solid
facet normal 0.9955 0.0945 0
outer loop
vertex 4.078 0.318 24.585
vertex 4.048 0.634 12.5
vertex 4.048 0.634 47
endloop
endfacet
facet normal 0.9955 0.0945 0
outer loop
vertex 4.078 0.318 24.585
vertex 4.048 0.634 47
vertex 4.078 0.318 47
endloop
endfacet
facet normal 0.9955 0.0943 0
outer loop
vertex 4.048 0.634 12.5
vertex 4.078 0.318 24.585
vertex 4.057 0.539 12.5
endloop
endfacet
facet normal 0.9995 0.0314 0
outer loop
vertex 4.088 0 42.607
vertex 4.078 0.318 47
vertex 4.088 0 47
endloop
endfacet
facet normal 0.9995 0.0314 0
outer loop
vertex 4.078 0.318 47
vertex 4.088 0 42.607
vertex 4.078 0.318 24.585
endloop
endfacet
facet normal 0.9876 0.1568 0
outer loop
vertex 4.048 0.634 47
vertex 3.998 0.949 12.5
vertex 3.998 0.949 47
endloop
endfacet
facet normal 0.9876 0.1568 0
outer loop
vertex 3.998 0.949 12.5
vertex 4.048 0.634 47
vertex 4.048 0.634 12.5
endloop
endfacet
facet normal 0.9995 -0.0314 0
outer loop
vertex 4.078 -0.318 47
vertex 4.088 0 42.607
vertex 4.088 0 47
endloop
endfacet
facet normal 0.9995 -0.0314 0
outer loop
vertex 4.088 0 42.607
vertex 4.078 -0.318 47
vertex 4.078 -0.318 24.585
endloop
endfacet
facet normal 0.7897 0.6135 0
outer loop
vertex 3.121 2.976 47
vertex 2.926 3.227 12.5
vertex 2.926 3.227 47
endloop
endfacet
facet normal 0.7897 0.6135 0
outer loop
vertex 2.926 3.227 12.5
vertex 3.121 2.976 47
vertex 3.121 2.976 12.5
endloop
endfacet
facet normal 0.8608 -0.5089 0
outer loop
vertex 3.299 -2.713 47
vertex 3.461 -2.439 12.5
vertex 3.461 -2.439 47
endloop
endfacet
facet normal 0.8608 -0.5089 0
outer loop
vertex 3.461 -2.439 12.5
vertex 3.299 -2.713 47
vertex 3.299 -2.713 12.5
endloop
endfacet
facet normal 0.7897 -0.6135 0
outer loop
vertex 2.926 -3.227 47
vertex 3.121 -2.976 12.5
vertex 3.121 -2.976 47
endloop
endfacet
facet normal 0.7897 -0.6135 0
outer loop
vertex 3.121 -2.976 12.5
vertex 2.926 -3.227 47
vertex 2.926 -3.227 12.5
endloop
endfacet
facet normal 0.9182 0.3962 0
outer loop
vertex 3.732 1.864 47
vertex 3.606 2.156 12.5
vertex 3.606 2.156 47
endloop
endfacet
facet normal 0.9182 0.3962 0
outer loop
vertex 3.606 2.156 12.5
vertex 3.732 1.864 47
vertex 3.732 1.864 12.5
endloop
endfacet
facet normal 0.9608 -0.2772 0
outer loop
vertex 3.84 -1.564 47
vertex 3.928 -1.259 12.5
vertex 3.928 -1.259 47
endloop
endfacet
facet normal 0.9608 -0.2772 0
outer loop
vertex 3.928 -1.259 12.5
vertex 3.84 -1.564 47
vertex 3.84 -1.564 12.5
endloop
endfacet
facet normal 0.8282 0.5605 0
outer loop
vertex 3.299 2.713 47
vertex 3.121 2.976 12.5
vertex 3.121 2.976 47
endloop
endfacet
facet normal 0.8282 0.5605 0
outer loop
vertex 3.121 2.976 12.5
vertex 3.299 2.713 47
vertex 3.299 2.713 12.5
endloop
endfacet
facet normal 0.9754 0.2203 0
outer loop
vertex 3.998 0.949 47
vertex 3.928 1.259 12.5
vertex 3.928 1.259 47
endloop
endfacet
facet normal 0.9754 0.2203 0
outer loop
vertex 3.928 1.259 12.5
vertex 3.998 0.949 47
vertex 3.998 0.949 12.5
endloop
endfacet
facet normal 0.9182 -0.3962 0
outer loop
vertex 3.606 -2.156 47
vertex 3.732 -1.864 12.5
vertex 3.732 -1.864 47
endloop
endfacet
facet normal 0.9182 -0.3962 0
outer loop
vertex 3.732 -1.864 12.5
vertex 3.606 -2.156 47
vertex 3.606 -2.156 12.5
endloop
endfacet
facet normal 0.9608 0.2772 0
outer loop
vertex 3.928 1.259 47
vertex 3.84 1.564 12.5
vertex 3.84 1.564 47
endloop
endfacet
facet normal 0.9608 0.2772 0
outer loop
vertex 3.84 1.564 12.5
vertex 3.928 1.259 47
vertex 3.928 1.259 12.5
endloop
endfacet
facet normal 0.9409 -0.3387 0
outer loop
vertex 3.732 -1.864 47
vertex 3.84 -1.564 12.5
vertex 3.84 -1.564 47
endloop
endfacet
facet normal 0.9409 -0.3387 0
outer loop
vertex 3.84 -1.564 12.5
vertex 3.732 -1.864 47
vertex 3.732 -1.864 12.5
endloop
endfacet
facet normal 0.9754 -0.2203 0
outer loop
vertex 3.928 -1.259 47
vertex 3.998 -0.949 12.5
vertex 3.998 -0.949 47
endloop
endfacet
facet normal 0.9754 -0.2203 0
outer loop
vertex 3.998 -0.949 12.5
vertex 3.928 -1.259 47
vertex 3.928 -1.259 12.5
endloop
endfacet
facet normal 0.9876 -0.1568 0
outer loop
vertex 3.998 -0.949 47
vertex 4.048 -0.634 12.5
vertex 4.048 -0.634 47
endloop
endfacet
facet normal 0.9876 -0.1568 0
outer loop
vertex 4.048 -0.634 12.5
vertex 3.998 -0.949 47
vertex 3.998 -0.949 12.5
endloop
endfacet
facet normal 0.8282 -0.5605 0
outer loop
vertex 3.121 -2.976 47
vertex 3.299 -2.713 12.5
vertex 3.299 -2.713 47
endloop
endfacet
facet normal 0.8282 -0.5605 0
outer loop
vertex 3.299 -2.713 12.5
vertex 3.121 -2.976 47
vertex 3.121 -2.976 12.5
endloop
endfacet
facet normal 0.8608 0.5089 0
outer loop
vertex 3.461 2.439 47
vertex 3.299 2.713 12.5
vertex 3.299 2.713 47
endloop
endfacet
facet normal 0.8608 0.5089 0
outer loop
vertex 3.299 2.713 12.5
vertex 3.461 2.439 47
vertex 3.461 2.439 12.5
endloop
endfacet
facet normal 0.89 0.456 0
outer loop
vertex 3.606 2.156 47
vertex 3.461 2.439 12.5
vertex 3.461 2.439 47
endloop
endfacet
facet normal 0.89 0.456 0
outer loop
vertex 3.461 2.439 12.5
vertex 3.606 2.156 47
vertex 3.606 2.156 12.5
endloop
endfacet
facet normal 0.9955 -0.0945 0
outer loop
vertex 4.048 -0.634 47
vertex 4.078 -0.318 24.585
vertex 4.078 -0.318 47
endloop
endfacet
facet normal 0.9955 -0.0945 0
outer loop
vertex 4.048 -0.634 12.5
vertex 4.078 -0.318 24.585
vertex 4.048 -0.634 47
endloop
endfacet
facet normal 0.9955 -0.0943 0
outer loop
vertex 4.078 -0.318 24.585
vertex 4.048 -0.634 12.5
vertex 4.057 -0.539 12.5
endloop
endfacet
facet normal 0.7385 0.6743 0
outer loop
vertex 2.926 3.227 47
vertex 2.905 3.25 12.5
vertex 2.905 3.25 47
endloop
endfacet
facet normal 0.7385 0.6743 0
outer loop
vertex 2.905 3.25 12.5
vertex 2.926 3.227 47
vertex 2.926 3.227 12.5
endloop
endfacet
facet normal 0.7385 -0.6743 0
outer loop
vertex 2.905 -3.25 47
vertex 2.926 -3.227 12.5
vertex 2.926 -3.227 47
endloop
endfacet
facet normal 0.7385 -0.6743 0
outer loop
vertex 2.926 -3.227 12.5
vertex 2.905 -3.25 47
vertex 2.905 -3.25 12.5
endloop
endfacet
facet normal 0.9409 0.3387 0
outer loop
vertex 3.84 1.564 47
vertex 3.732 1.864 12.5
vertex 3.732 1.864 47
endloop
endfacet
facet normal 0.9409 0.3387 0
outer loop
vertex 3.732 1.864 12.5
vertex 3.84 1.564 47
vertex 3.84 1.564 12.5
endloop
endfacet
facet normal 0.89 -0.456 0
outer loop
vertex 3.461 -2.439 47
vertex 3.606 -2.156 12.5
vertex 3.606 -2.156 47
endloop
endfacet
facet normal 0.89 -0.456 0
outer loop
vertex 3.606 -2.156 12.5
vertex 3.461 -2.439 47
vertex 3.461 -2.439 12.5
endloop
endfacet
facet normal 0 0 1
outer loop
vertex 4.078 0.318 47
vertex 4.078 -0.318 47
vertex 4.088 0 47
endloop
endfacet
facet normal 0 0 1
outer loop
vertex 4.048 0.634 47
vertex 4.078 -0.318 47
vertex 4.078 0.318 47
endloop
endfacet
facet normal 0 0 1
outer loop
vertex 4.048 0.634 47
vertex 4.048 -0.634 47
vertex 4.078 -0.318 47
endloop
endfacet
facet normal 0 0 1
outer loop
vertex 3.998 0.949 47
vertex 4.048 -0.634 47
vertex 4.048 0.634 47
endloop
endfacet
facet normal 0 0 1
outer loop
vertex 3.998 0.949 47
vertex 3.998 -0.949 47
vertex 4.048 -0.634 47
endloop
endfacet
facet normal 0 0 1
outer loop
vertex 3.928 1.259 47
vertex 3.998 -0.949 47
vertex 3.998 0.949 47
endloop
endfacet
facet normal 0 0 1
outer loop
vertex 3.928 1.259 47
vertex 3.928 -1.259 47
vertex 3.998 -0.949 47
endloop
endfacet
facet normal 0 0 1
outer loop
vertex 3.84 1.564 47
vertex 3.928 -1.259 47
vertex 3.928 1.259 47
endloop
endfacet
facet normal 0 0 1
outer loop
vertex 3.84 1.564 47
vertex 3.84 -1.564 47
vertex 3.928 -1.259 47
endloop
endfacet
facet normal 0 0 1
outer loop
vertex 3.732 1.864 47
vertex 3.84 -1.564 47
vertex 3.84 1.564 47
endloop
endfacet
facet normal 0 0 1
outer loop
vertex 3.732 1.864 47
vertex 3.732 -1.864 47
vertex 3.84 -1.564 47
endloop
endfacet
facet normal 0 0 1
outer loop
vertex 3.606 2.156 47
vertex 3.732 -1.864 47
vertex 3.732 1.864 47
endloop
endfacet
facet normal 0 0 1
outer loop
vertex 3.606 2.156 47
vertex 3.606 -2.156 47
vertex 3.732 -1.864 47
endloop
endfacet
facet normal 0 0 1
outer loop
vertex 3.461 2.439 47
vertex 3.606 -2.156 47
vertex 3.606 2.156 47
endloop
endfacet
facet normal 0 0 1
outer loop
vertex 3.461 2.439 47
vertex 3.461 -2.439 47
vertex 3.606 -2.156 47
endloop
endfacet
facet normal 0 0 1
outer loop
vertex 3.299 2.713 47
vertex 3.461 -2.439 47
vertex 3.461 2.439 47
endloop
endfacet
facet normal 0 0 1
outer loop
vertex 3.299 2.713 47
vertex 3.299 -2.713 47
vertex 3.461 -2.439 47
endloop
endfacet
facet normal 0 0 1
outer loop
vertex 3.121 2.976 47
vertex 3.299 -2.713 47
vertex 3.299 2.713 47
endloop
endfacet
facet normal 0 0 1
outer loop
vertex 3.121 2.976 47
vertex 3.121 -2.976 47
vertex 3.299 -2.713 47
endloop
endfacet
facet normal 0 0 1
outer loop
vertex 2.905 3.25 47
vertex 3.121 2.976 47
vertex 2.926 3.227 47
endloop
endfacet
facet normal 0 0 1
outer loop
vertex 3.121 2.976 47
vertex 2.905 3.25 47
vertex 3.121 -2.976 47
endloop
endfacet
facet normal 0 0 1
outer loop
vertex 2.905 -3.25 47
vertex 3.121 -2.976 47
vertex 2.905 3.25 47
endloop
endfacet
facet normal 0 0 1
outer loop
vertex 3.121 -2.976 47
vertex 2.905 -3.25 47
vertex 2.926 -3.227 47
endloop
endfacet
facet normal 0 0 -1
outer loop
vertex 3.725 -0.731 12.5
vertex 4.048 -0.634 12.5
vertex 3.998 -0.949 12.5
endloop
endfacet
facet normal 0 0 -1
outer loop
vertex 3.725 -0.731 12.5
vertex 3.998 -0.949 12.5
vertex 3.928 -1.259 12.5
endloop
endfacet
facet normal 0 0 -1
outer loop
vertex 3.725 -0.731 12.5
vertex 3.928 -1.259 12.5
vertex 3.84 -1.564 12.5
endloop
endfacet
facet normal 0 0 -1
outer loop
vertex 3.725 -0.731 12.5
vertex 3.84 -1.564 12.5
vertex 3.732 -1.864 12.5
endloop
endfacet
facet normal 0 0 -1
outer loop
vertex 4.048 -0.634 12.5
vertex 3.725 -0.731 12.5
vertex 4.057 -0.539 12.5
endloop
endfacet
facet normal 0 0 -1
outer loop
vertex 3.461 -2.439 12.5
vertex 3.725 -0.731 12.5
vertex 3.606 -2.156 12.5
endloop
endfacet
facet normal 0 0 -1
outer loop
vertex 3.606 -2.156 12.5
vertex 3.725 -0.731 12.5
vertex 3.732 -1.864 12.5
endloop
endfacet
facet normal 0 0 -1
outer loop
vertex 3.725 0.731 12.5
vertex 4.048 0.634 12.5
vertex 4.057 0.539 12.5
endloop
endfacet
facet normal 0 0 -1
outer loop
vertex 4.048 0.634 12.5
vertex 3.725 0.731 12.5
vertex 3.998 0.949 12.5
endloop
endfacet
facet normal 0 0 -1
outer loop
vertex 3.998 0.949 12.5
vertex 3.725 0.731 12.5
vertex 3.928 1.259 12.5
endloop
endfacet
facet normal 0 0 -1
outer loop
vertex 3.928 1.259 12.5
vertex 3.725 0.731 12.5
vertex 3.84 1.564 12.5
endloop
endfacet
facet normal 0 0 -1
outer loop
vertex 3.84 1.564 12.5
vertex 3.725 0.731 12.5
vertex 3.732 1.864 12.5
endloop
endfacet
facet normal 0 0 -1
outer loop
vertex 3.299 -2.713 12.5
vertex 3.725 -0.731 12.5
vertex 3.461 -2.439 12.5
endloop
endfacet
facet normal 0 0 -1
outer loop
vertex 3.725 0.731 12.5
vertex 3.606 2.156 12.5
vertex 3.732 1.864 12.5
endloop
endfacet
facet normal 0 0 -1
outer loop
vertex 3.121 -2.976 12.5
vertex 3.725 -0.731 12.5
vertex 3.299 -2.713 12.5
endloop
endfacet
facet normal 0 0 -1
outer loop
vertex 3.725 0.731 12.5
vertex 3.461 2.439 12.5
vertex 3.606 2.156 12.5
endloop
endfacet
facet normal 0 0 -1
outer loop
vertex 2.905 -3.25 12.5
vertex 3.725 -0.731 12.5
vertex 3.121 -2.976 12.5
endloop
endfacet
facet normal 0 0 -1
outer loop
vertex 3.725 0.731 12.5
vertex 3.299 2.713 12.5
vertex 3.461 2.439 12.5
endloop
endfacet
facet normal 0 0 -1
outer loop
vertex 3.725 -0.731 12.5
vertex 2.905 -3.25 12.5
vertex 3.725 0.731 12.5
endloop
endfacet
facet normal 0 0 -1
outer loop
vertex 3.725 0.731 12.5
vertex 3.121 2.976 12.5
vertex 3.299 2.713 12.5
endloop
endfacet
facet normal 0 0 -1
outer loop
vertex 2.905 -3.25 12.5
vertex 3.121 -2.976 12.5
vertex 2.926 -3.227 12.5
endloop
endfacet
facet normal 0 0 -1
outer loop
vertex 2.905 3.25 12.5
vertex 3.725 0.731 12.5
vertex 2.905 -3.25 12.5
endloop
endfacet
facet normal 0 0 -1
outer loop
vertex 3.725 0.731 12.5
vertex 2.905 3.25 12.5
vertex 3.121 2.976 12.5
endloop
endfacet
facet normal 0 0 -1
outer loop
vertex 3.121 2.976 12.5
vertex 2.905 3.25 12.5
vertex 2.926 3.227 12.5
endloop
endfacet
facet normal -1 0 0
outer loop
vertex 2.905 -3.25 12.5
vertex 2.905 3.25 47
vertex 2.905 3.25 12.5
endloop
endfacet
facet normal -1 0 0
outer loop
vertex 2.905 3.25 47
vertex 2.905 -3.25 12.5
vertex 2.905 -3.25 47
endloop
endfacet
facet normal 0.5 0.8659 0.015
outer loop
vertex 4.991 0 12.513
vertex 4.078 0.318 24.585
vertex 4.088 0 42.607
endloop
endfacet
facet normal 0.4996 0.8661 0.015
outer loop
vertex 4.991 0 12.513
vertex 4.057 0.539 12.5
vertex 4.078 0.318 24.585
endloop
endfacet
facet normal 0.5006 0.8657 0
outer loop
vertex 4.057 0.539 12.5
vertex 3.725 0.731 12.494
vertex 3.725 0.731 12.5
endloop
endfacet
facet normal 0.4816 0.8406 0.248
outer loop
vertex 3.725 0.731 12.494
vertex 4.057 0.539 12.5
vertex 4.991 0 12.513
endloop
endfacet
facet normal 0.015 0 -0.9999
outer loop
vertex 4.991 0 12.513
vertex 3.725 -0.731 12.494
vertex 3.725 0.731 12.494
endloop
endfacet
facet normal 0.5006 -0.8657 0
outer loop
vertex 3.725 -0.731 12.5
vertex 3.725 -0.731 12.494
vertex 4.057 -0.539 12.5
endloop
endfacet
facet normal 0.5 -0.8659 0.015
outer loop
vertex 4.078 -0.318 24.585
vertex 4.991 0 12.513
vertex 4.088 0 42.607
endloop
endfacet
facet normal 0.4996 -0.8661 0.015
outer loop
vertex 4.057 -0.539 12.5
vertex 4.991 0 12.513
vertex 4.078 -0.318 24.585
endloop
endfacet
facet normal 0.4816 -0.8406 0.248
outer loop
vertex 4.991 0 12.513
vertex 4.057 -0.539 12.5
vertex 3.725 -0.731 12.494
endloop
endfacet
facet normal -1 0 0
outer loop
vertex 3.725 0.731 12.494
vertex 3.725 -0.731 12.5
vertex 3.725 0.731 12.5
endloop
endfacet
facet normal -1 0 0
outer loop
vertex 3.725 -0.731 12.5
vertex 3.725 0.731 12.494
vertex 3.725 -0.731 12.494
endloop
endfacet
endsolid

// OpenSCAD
// file: reed/BOSL2/std.scad
// Minimal BOSL2 compatibility shim for bundled gallery models.
// It implements only the helpers used by the imported OpenSCAD projects.

CENTER = [0, 0, 0];
BOTTOM = [0, 0, -1];
TOP = [0, 0, 1];
LEFT = [-1, 0, 0];
RIGHT = [1, 0, 0];
FRONT = [0, -1, 0];
BACK = [0, 1, 0];

module up(z=0) {
    translate([0, 0, z]) children();
}

module down(z=0) {
    translate([0, 0, -z]) children();
}

module attach(anchor=CENTER) {
    children();
}

module cuboid(size=[1, 1, 1], anchor=CENTER) {
    center = anchor == CENTER;
    translate(center ? [0, 0, 0] : [0, 0, size[2] / 2])
        cube(size, center=true);
    children();
}

module xcyl(h=1, r=1, anchor=CENTER) {
    center = anchor == CENTER;
    translate(center ? [0, 0, 0] : [h / 2, 0, 0])
        rotate([0, 90, 0])
            cylinder(h=h, r=r, center=true);
}
// file: reed/reed.scad
use <BOSL2/std.scad>

holder_completeness_percent = 33;

module pipe(length, outer_diameter, thickness, cap=0, center=true){
    if(cap == 0){
        difference(){
            cylinder(h=length, d=outer_diameter, center = center);
            translate([0,0,-0.1*length]) cylinder(h=length*1.3, d=outer_diameter-thickness*2, center = center);
        }
    } else {
        difference(){
            cylinder(h=length, d=outer_diameter, center = center);
            translate([0,0,-cap]) cylinder(h=length, d=outer_diameter-thickness*2, center = center);
        }
    }
}

module partial_pipe(length, outer_diameter, thickness, completeness_percent=33){
    echo(str("partial_pipe(", length, ", ", outer_diameter, ", ", thickness, ", ", completeness_percent));
    difference(){
        rotate_extrude(angle=completeness_percent*360/100, convexity = 2){
            translate([0.01, 0, 0]) square([outer_diameter/2 - 0.01, length], center = false);
        }
        translate([0,0,-0.1*length]) cylinder(h=length*1.2,d=outer_diameter - thickness*2, center = false);
    }
}

module reed_burdon_ending(total_length, end_length, d) {
    // pogrubienie przy mocowaniu
    translate([0,0,-end_length]){
        flute_count = 5;
        union() {
            difference() { // stożek
                cylinder(h=end_length,r2=d/2,r1=d/2*0.75,center=false);
                translate([0,0,-end_length*0.05]) cylinder(h=end_length*1.1,r2=d/2*0.8,r1=d/2*0.65,center=false);
            }
            // for(i=[1:flute_count]){ //karbowanie
            //     translate([0,0,(i-1)*end_length/flute_count]){
            //         pipe(length=end_length/flute_count/2, outer_diameter=d*lerp(0.80, 1.1, i/flute_count), thickness=0.6, center=false);
            //         // echo(i*end_length/flute_count);
            //     }
            // } //karby
        } // karbowanie
    } // pogrubienie
}

module reed_ending(total_length, end_length, d) {
    wall_thickness = d * 0.11;
    translate([0,0,-end_length]){
        flute_count = 5;
        union() {
            difference() { // stożek
                cylinder(h=end_length,r1=d/2-wall_thickness+0.4,r2=d/2);
                translate([0,0,-end_length*0.05]) cylinder(h=end_length*1.1,r1=d/2-wall_thickness,r2=d/2-wall_thickness);
            }
            // for(i=[1:flute_count]){ //karbowanie
            //     translate([0,0,(i-1)*end_length/flute_count]){
            //         pipe(length=end_length/flute_count/2, outer_diameter=d+2*wall_thickness, thickness=0.6, center=false);
            //         // echo(i*end_length/flute_count);
            //     }
            // } //karby
        } // karbowanie
    } // pogrubienie
}

module reed_base(total_length, end_length, d){
    translate([0, 0, end_length]) {
        // główny cylinder
        cylinder(h=total_length - end_length, d=d);
        reed_ending(total_length, end_length, d);
    } // wyrównanie po dodaniu końcówki
}
// file: variants-reed-pipe.scad
// // potentially for "A" pipe!
// variants_reed_pipe_length = 60;
// variants_reed_pipe_in_diameter = 6.5;

variants_reed_pipe_length = 50;
variants_reed_pipe_end_length = 0.25 * variants_reed_pipe_length;
variants_reed_pipe_in_diameter = 6.5;
variants_reed_pipe_cut_prcnt = 10;
variants_reed_pipe_leaf_degree = 1.7;
variants_pipe_leaf_stem_heigth_coeff_init = 0.025;
variants_pipe_leaf_stem_heigth_coeff = 0.010;
// file: reed/reed_2_0_0.scad
include <reed.scad>

completeness_percent = 25;
wall_thickness = 0.8;
reed_plug_overhang_suppressor_len = 2;
eps = 0.01;

module reed_plug(total_length, end_length, d) {
    d_out = d+wall_thickness*2;

    translate([0,0,-end_length]){
        difference() {
            cylinder(h=end_length,d2=d_out*1.1,d1=d+0.8);
            translate([0,0,-eps/2]) cylinder(h=end_length+eps,d=d);
        }
    }

    // // anti overhanger
    // translate([0,0,0]) {
    //     difference() {
    //         cylinder(h=reed_plug_overhang_suppressor_len,d1=d_out*1.1,d2=d+0.8);
    //         translate([0,0,-eps/2]) cylinder(h=2+eps,d=d);
    //     }
    // }
}

module reed2_base(total_length, end_length, d){
    d_out = d+wall_thickness*2;
    translate([0, 0, end_length]) {
        difference() {
            cylinder(h=total_length - end_length, d=d_out);
            translate([0, 0, -0.1]) cylinder(h = (total_length - end_length)*0.9, d = d);
        }
    } 
}

module reed2_leaf_socket(heigth_cut_prcnt, d, total_length) {
    d_out = d+wall_thickness*2;
    // deepens the cut, for more secure leaf hold
    translate([-heigth_cut_prcnt/120 * d_out, 0, 0]) cube(size=[heigth_cut_prcnt/50 * d_out * 1.1, d_out*1.1, total_length * 0.1]);
}

module reed2_base_flat_cutting_cube(d, heigth_cut_prcnt, total_length) {
    d_out = d+wall_thickness*2;
    translate([d_out/2 - d_out * heigth_cut_prcnt / 100, -d_out/2, 0.25 * total_length]) {
        cube(size=[d_out, d_out, total_length * 0.80]);
        // reed2_leaf_socket(heigth_cut_prcnt, d, total_length);
    }
}

module reed2_base_flat_cut(total_length, end_length, d, heigth_cut_prcnt) {
    difference(){
        reed2_base(total_length, end_length, d);
        translate([0,0,-0.5]) reed2_base_flat_cutting_cube(d, heigth_cut_prcnt, total_length+2/*a gap for reed fitting*/);
    }
}

module reed2_cut(total_length, d, heigth_cut_prcnt, leaf_degree) {
    d_out = d+2*wall_thickness;
    translate([d_out/2 - d_out * heigth_cut_prcnt / 100 + 0.1/*<- fill the little gap between leaf and reed*/, -d_out/2, 0.35 * total_length]) {
        rotate([0, -leaf_degree, 0]) rotate([180, 90, -90]) {
            rotate_extrude(angle = leaf_degree, $fn=100) {
                rotate([0, 0, 90]) {
                    square([d_out, total_length * 0.70]);
                }
            }
        }
    }
}

module reed2_leaf(total_length, end_length, d, heigth_cut_prcnt, stem_heigth_coeff_init, stem_heigth_coeff) {
    d_out = d+2*wall_thickness;
    leaf_len = (total_length - end_length)*0.9;
    
    // trunk of the leaf ;)
    translate([-d*0.15,0,0]) intersection(){
        cylinder(h=total_length * 0.94, d=d_out*1.25);
        reed2_base_flat_cutting_cube(d_out, heigth_cut_prcnt, total_length);
    }

    // support stem
    translate([d_out/2+leaf_len*stem_heigth_coeff_init/2-d*0.1/2, 0, end_length]) rotate([0,-atan(stem_heigth_coeff_init-stem_heigth_coeff),0]) rotate([0,0,-120]) cylinder(leaf_len, leaf_len*stem_heigth_coeff_init, leaf_len*stem_heigth_coeff, $fn=3);
    
    // text
    // translate([d/2-wall_thickness/6, d/8, end_length]) rotate([180,-90,0]) reed2_text(total_length, end_length, d, heigth_cut_prcnt, "-", wall_thickness);
    
    // // round clip
    // difference() {
    //     rotate([0,0,180-(90)/2*360/100]) translate([0,0,end_length]) partial_pipe(total_length/10, d_out+0.8, 0.6, completeness_percent=90);
    //     rotate([0,0,180-(completeness_percent)/2*360/100]) translate([0,0,end_length]) translate([0,0,-0.05]) partial_pipe(total_length/10+0.1, d_out+0.81, 0.61, completeness_percent=completeness_percent);
    // }
}

module reed2_text(total_length, end_length, d, heigth_cut_prcnt, leaf_degree, wall_thickness) {
    my_text = str("L", total_length, " EL", end_length, " D", d, " HC", heigth_cut_prcnt, " LD", leaf_degree);
    linear_extrude(wall_thickness) text(my_text, size = (total_length - end_length)/24);
}

module reed2(total_length, end_length, d, heigth_cut_prcnt, leaf_degree) {
    halved_leaf_degree = leaf_degree/2;
    d_out = d+2*wall_thickness;

    // first part: plug
    translate([0,0,end_length]) reed_plug(total_length, end_length, d);

    // main part
    difference() {
        reed2_base_flat_cut(total_length, end_length, d, heigth_cut_prcnt); // just a flat cut
        reed2_cut(total_length, d, heigth_cut_prcnt, halved_leaf_degree); // deeper cut, half of the leaf degree is added here
    }

    // // grips

    //     // vertical grip
    //     difference() {
    //         rotate([0,0,180-(completeness_percent)/2*360/100]) translate([0,0,end_length+reed_plug_overhang_suppressor_len]) partial_pipe(total_length/10, d_out+0.8, 0.41, completeness_percent=completeness_percent);
    //         rotate([0,0,180-(completeness_percent-10)/2*360/100]) translate([0,0,end_length+reed_plug_overhang_suppressor_len]) translate([0,0,-0.005]) partial_pipe(total_length/10+0.01, d_out+0.81, 0.41, completeness_percent=completeness_percent-10);
    //     }

        // horizontal grip - powstrzymuje klej!!!
        difference() {
            translate([0,0,end_length+reed_plug_overhang_suppressor_len+total_length/10]) {
                difference() {
                    cylinder(h=reed_plug_overhang_suppressor_len,d1=d_out*1.2,d2=d);
                    translate([0,0,-eps/2]) cylinder(h=2+eps,d=d);
                }
            }
            reed2_base_flat_cutting_cube(d, variants_reed_pipe_cut_prcnt, total_length);
        }
}
// main file
include <reed/reed_2_0_0.scad>
include <variants-reed-pipe.scad>

$fn=100;

reed2_leaf( variants_reed_pipe_length,
            variants_reed_pipe_end_length,
            variants_reed_pipe_in_diameter,
            variants_reed_pipe_cut_prcnt,
            variants_pipe_leaf_stem_heigth_coeff_init,
            variants_pipe_leaf_stem_heigth_coeff
);
